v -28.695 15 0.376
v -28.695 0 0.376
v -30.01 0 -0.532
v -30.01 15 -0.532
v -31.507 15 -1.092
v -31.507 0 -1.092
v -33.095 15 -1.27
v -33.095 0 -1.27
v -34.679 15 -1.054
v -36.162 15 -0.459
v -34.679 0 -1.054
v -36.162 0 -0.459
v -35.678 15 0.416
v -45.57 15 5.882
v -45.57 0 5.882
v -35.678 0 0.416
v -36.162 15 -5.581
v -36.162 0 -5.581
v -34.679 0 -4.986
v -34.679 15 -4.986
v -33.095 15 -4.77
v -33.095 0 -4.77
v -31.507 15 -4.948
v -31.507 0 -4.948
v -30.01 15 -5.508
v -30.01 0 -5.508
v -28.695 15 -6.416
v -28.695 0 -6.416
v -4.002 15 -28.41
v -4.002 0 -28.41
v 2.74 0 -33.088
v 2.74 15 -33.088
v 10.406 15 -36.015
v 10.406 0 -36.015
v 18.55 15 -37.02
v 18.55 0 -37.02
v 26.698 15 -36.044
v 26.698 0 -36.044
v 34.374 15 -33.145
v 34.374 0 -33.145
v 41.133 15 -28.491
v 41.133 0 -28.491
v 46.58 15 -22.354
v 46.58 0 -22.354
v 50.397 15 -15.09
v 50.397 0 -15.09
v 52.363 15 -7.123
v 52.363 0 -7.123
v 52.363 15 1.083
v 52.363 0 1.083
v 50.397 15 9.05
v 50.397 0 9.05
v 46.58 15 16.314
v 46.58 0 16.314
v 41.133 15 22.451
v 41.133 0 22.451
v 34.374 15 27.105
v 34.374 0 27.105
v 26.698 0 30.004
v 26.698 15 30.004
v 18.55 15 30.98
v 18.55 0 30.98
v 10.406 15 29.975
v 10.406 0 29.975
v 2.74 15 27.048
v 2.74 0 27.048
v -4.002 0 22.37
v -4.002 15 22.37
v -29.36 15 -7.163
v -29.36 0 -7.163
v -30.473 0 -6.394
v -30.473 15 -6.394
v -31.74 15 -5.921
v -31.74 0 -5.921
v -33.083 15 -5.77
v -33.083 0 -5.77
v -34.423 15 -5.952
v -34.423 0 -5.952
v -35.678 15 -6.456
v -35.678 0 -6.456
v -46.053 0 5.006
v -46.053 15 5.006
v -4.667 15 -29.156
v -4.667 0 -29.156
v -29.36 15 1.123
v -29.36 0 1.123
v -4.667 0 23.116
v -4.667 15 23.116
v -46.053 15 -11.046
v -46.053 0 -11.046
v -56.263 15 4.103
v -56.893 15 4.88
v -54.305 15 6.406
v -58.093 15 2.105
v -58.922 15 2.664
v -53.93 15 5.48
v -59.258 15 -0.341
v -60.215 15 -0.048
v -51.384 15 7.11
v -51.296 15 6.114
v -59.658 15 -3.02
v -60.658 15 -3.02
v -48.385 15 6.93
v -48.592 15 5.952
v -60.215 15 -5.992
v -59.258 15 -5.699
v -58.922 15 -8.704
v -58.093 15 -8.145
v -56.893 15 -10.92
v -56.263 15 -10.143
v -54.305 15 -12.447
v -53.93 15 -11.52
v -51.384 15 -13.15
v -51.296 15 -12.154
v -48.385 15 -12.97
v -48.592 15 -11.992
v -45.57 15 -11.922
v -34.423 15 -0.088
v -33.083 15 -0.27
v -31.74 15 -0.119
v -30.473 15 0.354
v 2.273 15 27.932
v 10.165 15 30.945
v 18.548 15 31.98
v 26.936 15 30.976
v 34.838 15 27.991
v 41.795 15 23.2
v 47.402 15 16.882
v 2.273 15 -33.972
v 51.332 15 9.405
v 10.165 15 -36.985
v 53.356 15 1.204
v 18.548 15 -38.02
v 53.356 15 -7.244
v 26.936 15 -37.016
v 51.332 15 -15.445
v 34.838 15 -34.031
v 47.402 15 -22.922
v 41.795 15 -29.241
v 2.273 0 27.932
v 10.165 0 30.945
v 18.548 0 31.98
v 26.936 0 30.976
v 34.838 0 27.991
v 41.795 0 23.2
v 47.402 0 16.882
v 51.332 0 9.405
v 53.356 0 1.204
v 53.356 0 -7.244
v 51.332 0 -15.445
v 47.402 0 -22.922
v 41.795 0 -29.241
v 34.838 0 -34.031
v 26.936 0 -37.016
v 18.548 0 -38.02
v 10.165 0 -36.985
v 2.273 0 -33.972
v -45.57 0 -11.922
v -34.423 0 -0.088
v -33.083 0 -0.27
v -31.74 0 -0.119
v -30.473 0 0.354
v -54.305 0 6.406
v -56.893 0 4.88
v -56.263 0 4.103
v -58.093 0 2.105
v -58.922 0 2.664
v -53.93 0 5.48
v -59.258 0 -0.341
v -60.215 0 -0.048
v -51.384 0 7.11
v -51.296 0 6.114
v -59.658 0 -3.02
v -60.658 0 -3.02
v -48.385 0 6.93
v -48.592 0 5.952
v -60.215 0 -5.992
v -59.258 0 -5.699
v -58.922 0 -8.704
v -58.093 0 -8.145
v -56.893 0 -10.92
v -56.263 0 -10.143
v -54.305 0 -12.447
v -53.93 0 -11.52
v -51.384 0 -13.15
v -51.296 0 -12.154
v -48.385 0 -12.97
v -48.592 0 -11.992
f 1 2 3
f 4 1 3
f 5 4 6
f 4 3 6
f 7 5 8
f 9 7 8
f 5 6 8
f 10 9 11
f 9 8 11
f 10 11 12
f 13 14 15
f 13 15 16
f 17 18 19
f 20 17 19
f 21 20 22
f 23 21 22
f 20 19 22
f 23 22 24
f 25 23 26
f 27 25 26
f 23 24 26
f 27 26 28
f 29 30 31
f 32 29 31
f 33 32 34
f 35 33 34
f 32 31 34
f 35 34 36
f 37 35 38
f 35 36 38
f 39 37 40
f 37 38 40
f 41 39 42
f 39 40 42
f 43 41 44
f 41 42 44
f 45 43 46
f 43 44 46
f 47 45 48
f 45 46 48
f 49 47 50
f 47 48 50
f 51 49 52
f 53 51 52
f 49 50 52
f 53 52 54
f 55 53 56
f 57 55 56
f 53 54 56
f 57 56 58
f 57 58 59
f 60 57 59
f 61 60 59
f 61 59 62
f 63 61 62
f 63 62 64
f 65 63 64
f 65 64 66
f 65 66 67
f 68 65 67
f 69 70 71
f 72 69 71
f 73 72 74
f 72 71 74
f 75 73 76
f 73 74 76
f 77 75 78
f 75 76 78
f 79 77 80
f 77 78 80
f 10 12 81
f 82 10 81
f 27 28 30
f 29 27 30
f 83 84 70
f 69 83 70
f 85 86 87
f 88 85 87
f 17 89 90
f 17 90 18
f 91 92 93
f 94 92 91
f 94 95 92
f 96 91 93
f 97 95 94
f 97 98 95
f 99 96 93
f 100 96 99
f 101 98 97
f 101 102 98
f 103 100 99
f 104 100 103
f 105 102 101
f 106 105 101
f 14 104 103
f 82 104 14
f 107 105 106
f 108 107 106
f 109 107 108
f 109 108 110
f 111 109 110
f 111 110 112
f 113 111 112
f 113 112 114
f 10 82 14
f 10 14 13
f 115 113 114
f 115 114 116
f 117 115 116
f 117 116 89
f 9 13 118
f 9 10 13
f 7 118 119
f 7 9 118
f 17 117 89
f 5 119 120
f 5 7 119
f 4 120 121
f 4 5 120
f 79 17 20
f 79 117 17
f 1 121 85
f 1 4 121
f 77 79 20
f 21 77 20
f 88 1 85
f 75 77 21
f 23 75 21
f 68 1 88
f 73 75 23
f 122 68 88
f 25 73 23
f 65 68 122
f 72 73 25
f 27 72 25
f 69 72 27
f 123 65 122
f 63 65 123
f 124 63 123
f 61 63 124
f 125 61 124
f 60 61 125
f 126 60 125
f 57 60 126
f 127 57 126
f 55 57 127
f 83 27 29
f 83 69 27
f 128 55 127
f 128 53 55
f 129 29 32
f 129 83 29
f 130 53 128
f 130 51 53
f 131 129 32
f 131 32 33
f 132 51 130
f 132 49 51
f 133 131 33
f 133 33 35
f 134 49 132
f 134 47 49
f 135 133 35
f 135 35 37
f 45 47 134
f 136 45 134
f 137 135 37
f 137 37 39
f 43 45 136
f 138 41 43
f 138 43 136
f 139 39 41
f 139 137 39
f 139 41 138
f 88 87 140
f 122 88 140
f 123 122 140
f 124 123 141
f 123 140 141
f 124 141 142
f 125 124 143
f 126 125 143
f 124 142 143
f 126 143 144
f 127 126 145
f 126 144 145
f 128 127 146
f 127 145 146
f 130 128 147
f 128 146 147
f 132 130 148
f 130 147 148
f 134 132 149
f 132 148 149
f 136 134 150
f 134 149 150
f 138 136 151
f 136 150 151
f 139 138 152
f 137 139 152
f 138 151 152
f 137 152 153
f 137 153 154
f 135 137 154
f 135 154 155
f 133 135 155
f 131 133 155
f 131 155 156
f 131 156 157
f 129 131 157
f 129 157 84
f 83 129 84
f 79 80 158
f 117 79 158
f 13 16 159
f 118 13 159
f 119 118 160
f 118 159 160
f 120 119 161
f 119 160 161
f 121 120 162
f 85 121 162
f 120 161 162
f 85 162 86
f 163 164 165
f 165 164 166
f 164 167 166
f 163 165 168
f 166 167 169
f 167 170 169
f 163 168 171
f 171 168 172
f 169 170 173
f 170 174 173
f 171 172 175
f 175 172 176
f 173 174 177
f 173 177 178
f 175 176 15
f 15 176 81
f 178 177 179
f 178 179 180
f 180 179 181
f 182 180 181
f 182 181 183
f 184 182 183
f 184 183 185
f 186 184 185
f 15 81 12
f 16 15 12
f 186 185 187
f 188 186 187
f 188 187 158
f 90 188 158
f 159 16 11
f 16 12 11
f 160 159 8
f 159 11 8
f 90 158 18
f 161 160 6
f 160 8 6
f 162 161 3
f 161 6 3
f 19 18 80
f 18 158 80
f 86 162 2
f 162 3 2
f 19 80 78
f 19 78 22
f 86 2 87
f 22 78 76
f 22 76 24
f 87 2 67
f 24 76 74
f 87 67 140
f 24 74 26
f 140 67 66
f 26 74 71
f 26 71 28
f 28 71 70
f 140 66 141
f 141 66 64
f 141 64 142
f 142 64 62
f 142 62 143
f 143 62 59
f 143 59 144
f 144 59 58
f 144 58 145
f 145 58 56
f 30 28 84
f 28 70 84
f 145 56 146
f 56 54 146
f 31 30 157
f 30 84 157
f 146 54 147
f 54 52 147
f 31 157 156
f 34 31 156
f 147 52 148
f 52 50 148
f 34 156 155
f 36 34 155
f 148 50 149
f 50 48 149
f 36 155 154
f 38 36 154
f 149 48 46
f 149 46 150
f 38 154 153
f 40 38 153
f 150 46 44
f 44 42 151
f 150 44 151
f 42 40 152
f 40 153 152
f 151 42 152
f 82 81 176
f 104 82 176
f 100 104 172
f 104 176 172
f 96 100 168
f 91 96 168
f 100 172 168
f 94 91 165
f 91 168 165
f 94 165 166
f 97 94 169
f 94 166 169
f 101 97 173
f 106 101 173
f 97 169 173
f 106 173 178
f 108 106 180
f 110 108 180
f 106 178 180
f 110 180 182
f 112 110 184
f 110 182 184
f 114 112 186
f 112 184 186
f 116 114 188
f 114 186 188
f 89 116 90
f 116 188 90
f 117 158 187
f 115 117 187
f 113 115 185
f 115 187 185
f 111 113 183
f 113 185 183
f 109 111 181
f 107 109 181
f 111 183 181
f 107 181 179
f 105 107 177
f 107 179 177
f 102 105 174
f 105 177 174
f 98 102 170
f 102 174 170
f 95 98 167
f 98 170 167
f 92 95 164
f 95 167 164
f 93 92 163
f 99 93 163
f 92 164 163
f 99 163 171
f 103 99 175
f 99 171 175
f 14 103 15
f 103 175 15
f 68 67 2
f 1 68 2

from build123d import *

# Parameters (mm, degrees)
BOSS_EXTRUDE1_DEPTH = 15


with BuildPart() as part:
    # Sketch1 → Boss-Extrude1 (new body)
    with BuildSketch(Plane(origin=(0, 0, 0), x_dir=(1, 0, 0), z_dir=(0, 1, 0))):
        with BuildLine():
            ThreePointArc((-4.666988449, -23.116263327), (53.611641171, 3.020021854), (-4.666988449, 29.156307034))
            Line((-4.666988449, 29.156307034), (-29.36028846, 7.162891325))
            ThreePointArc((-29.36028846, 7.162891325), (-32.406824983, 5.804125188), (-35.678317621, 6.456019442))
            Line((-35.678317621, 6.456019442), (-45.569853208, 11.92154995))
            ThreePointArc((-45.569853208, 11.92154995), (-60.658358829, 3.020021854), (-45.569853208, -5.881506243))
            Line((-45.569853208, -5.881506243), (-35.678317621, -0.415975734))
            ThreePointArc((-35.678317621, -0.415975734), (-32.406824983, 0.235918519), (-29.36028846, -1.122847618))
            Line((-29.36028846, -1.122847618), (-4.666988449, -23.116263327))
        make_face()
        with BuildLine():
            ThreePointArc((-46.053482079, -5.006233077), (-59.658358829, 3.020021854), (-46.053482079, 11.046276784))
            Line((-46.053482079, 11.046276784), (-36.161946493, 5.580746276))
            ThreePointArc((-36.161946493, 5.580746276), (-32.295637011, 4.810325795), (-28.695184757, 6.41614032))
            Line((-28.695184757, 6.41614032), (-4.001884745, 28.409556029))
            ThreePointArc((-4.001884745, 28.409556029), (52.611641171, 3.020021854), (-4.001884745, -22.369512322))
            Line((-4.001884745, -22.369512322), (-28.695184757, -0.376096613))
            ThreePointArc((-28.695184757, -0.376096613), (-32.295637011, 1.229717913), (-36.161946493, 0.459297432))
            Line((-36.161946493, 0.459297432), (-46.053482079, -5.006233077))
        make_face(mode=Mode.SUBTRACT)
    extrude(amount=BOSS_EXTRUDE1_DEPTH)


solid = part.part
